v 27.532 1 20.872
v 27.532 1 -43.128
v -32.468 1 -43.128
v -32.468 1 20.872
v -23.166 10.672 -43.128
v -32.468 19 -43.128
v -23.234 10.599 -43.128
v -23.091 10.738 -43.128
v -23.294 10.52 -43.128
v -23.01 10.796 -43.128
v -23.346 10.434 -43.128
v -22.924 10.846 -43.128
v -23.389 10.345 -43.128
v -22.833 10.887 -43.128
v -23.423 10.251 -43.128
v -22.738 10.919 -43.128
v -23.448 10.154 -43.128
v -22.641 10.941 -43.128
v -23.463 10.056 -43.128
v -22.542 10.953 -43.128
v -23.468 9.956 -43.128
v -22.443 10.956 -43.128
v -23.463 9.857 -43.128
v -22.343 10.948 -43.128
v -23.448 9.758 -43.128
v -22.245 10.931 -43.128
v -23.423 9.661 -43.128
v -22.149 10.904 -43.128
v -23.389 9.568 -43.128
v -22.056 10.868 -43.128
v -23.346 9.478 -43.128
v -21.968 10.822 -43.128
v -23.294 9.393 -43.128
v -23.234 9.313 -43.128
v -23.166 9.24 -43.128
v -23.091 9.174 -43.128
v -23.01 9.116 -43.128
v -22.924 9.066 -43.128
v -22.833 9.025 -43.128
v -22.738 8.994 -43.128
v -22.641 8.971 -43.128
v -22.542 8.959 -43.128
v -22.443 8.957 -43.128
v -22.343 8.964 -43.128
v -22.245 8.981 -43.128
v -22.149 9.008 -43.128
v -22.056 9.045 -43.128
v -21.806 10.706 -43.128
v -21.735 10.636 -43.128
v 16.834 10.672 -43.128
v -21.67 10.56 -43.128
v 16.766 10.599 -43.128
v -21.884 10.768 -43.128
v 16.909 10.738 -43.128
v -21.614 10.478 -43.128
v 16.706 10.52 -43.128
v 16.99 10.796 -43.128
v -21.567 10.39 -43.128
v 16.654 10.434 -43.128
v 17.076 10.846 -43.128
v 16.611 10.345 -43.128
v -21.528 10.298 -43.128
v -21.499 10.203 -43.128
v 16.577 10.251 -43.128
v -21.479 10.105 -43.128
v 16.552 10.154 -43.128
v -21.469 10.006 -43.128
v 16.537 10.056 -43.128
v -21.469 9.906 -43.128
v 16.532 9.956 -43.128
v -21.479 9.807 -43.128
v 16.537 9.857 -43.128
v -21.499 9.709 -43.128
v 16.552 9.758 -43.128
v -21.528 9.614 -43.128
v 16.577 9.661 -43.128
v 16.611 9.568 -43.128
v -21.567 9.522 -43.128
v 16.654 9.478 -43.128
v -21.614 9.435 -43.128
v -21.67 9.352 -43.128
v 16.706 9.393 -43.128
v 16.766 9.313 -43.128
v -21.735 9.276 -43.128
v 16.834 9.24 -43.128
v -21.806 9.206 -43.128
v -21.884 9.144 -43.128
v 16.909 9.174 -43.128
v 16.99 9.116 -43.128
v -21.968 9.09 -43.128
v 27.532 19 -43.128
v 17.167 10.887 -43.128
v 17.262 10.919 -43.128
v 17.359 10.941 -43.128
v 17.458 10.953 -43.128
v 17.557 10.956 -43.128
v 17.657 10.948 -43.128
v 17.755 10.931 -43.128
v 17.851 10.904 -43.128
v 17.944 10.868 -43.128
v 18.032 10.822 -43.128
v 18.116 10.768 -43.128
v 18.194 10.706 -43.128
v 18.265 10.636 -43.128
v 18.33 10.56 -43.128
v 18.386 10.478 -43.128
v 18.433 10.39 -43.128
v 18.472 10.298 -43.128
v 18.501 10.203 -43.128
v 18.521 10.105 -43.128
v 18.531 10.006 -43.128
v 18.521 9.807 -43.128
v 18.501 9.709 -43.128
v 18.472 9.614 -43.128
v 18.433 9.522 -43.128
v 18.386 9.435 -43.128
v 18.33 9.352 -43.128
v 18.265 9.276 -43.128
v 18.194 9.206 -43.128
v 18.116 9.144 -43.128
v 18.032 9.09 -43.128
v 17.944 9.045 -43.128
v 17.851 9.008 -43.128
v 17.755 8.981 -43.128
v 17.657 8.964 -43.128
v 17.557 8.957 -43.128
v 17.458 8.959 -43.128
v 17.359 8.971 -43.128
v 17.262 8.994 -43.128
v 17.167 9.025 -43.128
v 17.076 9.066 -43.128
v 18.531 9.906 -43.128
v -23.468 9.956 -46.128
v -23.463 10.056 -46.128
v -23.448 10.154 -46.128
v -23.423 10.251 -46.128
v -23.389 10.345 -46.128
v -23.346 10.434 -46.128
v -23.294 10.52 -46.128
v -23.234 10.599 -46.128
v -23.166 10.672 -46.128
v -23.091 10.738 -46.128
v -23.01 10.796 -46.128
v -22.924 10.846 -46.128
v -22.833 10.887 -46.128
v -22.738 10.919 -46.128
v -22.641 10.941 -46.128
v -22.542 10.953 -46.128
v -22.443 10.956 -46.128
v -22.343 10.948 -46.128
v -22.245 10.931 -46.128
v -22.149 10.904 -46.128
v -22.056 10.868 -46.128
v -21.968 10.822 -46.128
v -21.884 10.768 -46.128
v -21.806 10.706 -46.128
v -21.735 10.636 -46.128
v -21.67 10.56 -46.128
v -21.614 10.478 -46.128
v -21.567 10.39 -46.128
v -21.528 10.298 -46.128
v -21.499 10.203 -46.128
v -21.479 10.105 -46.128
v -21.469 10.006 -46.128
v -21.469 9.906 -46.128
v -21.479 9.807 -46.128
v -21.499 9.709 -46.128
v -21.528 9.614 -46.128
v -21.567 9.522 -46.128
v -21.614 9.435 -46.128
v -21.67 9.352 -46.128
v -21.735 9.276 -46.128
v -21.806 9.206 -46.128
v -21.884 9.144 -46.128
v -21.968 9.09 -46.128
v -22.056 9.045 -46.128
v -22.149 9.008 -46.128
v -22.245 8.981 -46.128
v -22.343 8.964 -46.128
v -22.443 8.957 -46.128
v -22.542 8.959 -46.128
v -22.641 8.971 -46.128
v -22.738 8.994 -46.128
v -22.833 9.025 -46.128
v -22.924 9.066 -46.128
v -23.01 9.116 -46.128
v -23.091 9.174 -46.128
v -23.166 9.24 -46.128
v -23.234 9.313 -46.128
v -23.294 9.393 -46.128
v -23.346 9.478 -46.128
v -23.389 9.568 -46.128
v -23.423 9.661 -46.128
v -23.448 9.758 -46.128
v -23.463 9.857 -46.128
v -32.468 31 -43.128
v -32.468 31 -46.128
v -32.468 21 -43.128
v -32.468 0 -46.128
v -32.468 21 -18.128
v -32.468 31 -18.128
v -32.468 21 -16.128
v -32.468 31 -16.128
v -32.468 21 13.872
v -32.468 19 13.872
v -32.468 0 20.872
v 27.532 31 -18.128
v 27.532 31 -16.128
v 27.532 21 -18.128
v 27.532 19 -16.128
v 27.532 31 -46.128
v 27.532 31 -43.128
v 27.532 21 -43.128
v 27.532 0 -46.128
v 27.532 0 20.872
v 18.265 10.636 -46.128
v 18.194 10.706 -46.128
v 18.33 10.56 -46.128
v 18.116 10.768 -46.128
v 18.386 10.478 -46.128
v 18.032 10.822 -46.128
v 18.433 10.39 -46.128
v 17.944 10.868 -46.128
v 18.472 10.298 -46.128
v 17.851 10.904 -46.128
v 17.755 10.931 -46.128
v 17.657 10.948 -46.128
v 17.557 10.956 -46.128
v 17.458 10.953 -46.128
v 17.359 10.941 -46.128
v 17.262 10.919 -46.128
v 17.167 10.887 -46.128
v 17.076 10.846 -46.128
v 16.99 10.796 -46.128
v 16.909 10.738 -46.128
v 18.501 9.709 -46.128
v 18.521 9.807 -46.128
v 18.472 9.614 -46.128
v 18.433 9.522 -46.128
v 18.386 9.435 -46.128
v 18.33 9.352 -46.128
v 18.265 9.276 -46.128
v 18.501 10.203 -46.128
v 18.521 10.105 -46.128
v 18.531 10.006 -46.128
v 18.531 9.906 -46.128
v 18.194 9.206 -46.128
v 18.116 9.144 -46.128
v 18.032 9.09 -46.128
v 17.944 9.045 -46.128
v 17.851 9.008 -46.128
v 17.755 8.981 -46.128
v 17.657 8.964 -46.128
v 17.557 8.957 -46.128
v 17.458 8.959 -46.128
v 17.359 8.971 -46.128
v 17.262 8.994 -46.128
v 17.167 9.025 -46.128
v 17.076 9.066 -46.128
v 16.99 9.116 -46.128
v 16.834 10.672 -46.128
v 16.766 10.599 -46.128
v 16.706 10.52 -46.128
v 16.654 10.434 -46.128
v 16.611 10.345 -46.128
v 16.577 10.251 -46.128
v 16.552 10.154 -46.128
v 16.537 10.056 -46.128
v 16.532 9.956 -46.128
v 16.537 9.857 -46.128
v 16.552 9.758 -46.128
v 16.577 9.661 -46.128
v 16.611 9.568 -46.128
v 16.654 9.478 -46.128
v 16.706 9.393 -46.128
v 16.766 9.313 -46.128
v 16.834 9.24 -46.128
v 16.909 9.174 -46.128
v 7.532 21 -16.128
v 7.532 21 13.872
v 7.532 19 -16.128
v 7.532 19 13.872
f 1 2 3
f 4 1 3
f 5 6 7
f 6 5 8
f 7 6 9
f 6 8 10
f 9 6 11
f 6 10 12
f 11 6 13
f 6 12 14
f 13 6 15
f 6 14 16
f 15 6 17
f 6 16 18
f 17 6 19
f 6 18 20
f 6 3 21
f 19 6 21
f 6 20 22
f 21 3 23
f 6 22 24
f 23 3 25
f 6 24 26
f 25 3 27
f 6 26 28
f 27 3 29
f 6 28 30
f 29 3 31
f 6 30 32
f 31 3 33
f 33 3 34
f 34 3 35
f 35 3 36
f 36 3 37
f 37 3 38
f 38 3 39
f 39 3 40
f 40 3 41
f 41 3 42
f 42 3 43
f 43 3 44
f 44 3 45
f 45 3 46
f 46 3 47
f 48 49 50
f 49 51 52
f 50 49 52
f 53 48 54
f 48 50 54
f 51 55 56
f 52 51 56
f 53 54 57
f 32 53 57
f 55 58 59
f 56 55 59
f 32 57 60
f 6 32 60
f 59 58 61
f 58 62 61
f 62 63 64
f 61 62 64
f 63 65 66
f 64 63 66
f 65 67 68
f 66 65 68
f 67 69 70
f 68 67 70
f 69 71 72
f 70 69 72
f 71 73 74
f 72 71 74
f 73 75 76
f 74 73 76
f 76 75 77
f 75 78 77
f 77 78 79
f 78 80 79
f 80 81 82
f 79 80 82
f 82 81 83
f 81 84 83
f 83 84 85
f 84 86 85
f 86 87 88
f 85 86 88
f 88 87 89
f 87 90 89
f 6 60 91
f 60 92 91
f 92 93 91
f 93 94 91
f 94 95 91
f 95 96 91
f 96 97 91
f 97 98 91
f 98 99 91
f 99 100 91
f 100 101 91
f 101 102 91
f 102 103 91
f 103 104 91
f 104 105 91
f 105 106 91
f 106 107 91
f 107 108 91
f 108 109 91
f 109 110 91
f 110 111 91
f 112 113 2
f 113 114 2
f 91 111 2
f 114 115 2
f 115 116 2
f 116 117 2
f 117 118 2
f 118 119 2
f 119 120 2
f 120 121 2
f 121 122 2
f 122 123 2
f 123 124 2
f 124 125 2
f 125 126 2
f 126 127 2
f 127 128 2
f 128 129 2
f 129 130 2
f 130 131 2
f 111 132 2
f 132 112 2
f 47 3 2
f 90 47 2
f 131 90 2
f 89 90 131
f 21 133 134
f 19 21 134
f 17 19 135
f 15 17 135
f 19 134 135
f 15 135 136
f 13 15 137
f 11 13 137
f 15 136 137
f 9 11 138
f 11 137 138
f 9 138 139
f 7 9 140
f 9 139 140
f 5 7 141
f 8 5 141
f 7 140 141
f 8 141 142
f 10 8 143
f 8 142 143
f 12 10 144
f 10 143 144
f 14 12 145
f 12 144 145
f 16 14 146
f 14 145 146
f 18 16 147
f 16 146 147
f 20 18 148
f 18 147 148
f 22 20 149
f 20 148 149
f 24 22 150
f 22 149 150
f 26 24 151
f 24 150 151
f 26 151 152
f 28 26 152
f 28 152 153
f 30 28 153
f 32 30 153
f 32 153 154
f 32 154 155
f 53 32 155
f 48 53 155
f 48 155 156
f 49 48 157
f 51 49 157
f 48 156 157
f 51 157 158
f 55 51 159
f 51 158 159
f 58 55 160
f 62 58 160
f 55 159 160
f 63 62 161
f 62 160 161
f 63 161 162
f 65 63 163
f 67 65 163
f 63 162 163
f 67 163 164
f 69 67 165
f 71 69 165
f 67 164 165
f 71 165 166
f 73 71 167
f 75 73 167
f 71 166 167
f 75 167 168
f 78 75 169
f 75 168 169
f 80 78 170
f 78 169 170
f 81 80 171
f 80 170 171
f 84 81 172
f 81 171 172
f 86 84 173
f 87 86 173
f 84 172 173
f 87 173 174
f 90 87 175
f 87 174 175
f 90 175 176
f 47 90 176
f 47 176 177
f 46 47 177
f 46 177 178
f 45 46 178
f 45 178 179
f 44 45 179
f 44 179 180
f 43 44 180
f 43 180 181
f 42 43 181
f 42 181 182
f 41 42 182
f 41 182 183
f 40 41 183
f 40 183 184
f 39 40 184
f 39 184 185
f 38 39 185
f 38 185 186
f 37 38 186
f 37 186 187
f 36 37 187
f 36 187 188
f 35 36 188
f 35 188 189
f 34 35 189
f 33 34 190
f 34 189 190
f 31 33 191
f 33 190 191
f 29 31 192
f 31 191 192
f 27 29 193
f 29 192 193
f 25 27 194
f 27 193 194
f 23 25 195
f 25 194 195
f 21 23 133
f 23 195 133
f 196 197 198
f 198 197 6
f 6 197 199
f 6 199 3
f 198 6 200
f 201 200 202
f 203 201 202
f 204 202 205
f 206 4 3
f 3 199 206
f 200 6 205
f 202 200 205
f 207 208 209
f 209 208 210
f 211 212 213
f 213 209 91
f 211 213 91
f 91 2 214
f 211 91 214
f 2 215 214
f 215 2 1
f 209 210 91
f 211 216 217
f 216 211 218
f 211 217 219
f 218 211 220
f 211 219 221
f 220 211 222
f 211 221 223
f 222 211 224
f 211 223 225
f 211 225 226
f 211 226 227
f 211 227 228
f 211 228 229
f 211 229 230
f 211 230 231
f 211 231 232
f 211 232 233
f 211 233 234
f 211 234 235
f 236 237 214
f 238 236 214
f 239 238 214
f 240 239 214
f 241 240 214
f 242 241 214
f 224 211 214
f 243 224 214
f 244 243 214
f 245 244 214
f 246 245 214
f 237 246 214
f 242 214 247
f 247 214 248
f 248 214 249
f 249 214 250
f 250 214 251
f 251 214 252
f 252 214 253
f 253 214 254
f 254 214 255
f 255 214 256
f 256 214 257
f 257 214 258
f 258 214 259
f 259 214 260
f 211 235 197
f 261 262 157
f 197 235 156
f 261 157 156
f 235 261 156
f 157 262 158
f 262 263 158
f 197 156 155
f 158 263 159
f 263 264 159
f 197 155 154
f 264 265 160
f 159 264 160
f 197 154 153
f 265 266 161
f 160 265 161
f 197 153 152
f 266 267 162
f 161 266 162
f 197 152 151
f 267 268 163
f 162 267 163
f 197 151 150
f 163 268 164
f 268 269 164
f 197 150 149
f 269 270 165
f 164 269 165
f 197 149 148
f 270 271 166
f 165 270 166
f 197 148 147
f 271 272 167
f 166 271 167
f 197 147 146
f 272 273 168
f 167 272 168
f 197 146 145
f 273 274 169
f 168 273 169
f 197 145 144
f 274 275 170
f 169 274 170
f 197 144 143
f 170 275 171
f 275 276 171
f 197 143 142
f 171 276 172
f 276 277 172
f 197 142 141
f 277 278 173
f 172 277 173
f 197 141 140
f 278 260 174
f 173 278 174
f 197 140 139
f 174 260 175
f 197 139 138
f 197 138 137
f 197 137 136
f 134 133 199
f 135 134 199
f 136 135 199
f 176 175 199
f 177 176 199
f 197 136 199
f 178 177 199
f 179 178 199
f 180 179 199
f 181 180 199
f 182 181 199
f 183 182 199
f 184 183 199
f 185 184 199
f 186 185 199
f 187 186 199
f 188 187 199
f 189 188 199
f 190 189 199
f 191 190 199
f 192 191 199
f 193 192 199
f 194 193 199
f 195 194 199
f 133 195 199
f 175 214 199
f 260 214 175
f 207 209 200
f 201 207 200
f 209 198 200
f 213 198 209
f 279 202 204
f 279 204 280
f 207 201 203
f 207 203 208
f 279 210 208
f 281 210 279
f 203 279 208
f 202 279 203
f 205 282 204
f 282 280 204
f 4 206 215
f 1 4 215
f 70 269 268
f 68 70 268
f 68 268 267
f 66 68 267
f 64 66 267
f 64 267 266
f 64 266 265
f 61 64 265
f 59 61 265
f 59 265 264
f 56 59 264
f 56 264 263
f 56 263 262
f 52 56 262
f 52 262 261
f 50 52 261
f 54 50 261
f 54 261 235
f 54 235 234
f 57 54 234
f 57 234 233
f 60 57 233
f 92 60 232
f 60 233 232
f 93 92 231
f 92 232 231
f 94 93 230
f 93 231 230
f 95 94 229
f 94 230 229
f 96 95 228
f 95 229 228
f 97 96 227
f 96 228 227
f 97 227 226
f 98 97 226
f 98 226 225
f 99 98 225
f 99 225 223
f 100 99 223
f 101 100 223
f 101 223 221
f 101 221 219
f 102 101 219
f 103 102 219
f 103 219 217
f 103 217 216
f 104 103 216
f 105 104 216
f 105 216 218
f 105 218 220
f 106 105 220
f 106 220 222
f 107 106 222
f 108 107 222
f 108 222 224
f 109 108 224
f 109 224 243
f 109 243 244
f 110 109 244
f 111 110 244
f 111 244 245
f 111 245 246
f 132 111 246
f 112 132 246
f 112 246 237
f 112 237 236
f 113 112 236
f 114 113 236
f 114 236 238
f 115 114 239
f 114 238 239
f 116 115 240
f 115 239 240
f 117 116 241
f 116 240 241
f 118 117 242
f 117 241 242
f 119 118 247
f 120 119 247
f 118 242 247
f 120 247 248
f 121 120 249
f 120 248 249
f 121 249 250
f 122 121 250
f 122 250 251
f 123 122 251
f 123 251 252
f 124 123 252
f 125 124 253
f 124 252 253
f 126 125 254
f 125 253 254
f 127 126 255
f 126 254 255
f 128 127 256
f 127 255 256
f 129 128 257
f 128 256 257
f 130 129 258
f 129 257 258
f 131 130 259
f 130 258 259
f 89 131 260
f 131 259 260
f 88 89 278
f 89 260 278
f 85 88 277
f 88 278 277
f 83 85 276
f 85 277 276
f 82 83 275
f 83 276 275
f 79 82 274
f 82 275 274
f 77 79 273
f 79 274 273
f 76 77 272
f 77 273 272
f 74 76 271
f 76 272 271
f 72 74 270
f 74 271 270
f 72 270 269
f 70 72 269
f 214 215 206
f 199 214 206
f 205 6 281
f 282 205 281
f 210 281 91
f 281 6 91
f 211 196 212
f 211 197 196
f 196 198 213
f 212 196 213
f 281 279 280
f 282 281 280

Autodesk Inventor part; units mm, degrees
ref_plane "YZ Plane" through (0, 0, 0) normal (1, 0, 0) x (0, 1, 0)
ref_plane "XZ Plane" through (0, 0, 0) normal (0, 1, 0) x (-1, 0, 0)
ref_plane "XY Plane" through (0, 0, 0) normal (0, 0, 1) x (1, 0, 0)
sketch "Sketch1" plane through (0, 0, 0) normal (0, 1, 0) x (-1, 0, 0)
  line L0 (32.4676, 20.8715) -> (-27.5324, 20.8715)
  line L1 (-27.5324, 20.8715) -> (-27.5324, -46.1285)
  line L2 (-27.5324, -46.1285) -> (32.4676, -46.1285)
  line L3 (32.4676, -46.1285) -> (32.4676, 20.8715)
  point P0 (0, 0)
  dimension "d2" = 60
  dimension "d3" = 67
extrude "Extrusion1" add sketch "Sketch1" along normal blind 1
sketch "Sketch2" plane through (0, 1, 0) normal (0, 1, 0) x (1, 0, 0)
  line L0 (27.5324, 46.1285) -> (-32.4676, 46.1285) projected
  line L1 (-32.4676, 46.1285) -> (-32.4676, -20.8715) projected
  line L2 (27.5324, 46.1285) -> (-32.4676, 46.1285)
  line L3 (-32.4676, 46.1285) -> (-32.4676, 43.1285)
  line L4 (-32.4676, 43.1285) -> (27.5324, 43.1285)
  line L5 (27.5324, 43.1285) -> (27.5324, 46.1285)
  line L6 (27.5324, 46.1285) -> (24.5324, 46.1285)
  line L7 (24.5324, 46.1285) -> (24.5324, -13.8715)
  line L8 (24.5324, -13.8715) -> (27.5324, -13.8715)
  line L9 (27.5324, -13.8715) -> (27.5324, 46.1285)
  point P0 (0, 0)
  point P1 (24.5324, 43.1285)
  dimension "d8" = 3
  dimension "d9" = 3
extrude "Extrusion2" add sketch "Sketch2" along normal blind 20 contours L5 L4 L7 L0 | L7 L4 L1 L0
sketch "Sketch3" plane through (0, 21, 0) normal (0, 1, 0) x (1, 0, 0)
  line L0 (27.5324, 46.1285) -> (-32.4676, 46.1285) projected
  line L1 (-32.4676, 46.1285) -> (-32.4676, 43.1285) projected
  line L2 (-32.4676, 43.1285) -> (27.5324, 43.1285) projected
  line L3 (27.5324, 43.1285) -> (-32.4676, 43.1285) projected
  line L4 (-32.4676, 43.1285) -> (-32.4676, -20.8715) projected
  line L5 (-32.4676, -20.8715) -> (27.5324, -20.8715) projected
  line L6 (27.5324, 46.1285) -> (-32.4676, 46.1285) projected
  line L7 (27.5324, -20.8715) -> (27.5324, 46.1285) projected
  line L8 (-32.4676, 46.1285) -> (27.5324, 46.1285)
  line L9 (27.5324, 46.1285) -> (27.5324, 18.1285)
  line L10 (27.5324, 18.1285) -> (-32.4676, 18.1285)
  line L11 (-32.4676, 18.1285) -> (-32.4676, 46.1285)
  line L12 (-32.4676, 18.1285) -> (27.5324, 18.1285)
  line L13 (27.5324, 18.1285) -> (27.5324, 16.1285)
  line L14 (27.5324, 16.1285) -> (-32.4676, 16.1285)
  line L15 (-32.4676, 16.1285) -> (-32.4676, 18.1285)
  line L16 (27.5324, -20.8715) -> (27.5324, 43.1285) projected
  line L17 (27.5324, 43.1285) -> (27.5324, 46.1285) projected
  line L18 (-32.4676, 16.1285) -> (7.5324, 16.1285)
  line L19 (7.5324, 16.1285) -> (7.5324, -13.8715)
  line L20 (7.5324, -13.8715) -> (-32.4676, -13.8715)
  line L21 (-32.4676, -13.8715) -> (-32.4676, 16.1285)
  point P0 (0, 0)
  point P1 (-32.4676, 16.1285)
  point P2 (-32.4676, 18.1285)
  point P3 (-32.4676, -13.8715)
  dimension "d16" = 2
  dimension "d19" = 25
  dimension "d26" = 40
  dimension "d27" = 30
extrude "Extrusion3" add sketch "Sketch3" against normal blind 2 contours L7 L10 L4 L2 | L7 L14 L4 L10 | L14 L19 L20 L4
extrude "Extrusion5" add sketch "Sketch3" along normal blind 10 contours L7 L2 L1 L0 | L7 L14 L4 L10
sketch "Sketch5" plane through (27.5324, 0, -46.1285) normal (0, 0, -1) x (-1, 0, 0)
  circle A0 centre (10, 9.9562) radius 1
  circle A1 centre (50, 9.9562) radius 1
  line L0 (0, 0) -> (0, 31) projected
  point P0 (27.5324, 0)
  dimension "d20" = 2
  dimension "d21" = 2
  dimension "d22" = 40
  dimension "d23" = 10
extrude "Extrusion6" cut sketch "Sketch5" against normal blind 20
equation "\"d9\" = d8"
equation "\"d21\" = d20"
properties part number "electric_base"
